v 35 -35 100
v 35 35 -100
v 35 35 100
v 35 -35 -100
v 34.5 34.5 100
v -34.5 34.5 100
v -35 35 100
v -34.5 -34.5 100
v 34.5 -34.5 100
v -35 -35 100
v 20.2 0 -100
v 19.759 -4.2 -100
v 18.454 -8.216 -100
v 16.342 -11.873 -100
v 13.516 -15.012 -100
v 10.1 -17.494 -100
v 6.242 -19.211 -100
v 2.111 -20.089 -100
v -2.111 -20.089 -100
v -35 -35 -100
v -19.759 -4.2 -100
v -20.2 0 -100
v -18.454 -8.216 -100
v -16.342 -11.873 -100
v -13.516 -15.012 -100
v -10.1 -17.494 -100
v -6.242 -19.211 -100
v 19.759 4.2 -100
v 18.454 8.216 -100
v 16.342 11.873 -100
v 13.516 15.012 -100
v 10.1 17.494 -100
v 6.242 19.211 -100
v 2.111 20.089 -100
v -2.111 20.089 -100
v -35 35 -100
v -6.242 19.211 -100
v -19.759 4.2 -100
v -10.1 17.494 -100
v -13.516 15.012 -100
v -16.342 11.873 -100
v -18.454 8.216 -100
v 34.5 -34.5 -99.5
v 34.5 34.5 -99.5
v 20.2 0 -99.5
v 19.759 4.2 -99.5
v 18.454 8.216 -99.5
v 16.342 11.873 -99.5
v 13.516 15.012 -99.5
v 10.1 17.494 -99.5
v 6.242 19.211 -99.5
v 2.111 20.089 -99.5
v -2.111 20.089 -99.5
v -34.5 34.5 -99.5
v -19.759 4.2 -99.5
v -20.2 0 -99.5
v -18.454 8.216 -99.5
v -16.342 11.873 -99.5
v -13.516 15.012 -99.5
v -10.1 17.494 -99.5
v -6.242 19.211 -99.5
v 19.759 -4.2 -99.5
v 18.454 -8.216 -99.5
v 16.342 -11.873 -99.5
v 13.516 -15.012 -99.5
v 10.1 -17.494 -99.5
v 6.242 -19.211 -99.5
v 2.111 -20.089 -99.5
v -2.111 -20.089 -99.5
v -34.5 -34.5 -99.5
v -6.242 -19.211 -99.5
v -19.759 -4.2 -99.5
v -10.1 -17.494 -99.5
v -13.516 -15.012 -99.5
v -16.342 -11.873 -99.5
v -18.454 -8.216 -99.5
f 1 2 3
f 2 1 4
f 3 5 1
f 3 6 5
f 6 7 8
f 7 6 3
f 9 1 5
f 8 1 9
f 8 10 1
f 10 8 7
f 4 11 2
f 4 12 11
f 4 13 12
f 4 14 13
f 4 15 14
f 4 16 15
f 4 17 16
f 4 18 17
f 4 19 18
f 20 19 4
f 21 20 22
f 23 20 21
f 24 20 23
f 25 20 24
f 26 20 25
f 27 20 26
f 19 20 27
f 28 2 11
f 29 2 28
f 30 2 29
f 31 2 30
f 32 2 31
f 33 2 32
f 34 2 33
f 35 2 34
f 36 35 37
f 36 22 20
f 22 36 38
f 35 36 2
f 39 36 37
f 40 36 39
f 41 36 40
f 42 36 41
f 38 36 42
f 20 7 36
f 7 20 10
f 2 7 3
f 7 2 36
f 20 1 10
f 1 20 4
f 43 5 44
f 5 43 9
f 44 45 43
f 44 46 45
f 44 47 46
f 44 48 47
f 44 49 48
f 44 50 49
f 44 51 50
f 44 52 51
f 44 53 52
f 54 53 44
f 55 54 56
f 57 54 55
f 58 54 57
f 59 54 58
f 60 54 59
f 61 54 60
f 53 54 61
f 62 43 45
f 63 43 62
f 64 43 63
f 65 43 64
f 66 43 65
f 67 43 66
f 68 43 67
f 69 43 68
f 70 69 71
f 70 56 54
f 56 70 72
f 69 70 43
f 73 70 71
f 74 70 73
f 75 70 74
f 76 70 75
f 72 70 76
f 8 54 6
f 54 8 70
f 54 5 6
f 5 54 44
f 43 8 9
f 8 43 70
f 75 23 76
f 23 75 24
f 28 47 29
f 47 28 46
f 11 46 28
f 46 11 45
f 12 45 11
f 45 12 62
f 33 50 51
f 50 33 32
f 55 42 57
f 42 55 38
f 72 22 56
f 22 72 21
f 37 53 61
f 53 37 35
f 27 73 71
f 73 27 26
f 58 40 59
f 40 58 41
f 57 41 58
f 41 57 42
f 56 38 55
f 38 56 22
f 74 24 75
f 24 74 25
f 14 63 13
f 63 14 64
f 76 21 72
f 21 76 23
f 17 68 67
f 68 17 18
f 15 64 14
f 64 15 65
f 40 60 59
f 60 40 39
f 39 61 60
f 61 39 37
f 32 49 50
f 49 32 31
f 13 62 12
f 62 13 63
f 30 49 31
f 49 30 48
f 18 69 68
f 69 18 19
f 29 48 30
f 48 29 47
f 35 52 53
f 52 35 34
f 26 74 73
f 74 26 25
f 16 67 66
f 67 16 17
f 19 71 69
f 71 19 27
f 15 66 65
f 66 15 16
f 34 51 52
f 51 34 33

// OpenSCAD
lh = 200;
lw = 70;

difference(){
    cube([70,70,lh], true);
    translate([0,0,0.5])cube([70-1,70-1,lh], true);
    translate([0,0,-lh/2-5]) cylinder(  10, d1=40.4, d2=40.4);
}

//translate([0,0,-lh])
//difference(){
//    cube([lw,lw,2*lh], true);
//    cube([lw-1,lw-1,2*lh+1], true);
//    # translate([0,0,-lh])
//    rotate([50,0,0]) cube([lw*10,lw*10,lw*2], true);
//}
//translate([0,0,-2*lh+lw+39])
//intersection() {
//    cube([lw,lw,2*lh], true);
//    rotate([50,0,0]) cube([lw*10,lw*10,1], true);
//}
